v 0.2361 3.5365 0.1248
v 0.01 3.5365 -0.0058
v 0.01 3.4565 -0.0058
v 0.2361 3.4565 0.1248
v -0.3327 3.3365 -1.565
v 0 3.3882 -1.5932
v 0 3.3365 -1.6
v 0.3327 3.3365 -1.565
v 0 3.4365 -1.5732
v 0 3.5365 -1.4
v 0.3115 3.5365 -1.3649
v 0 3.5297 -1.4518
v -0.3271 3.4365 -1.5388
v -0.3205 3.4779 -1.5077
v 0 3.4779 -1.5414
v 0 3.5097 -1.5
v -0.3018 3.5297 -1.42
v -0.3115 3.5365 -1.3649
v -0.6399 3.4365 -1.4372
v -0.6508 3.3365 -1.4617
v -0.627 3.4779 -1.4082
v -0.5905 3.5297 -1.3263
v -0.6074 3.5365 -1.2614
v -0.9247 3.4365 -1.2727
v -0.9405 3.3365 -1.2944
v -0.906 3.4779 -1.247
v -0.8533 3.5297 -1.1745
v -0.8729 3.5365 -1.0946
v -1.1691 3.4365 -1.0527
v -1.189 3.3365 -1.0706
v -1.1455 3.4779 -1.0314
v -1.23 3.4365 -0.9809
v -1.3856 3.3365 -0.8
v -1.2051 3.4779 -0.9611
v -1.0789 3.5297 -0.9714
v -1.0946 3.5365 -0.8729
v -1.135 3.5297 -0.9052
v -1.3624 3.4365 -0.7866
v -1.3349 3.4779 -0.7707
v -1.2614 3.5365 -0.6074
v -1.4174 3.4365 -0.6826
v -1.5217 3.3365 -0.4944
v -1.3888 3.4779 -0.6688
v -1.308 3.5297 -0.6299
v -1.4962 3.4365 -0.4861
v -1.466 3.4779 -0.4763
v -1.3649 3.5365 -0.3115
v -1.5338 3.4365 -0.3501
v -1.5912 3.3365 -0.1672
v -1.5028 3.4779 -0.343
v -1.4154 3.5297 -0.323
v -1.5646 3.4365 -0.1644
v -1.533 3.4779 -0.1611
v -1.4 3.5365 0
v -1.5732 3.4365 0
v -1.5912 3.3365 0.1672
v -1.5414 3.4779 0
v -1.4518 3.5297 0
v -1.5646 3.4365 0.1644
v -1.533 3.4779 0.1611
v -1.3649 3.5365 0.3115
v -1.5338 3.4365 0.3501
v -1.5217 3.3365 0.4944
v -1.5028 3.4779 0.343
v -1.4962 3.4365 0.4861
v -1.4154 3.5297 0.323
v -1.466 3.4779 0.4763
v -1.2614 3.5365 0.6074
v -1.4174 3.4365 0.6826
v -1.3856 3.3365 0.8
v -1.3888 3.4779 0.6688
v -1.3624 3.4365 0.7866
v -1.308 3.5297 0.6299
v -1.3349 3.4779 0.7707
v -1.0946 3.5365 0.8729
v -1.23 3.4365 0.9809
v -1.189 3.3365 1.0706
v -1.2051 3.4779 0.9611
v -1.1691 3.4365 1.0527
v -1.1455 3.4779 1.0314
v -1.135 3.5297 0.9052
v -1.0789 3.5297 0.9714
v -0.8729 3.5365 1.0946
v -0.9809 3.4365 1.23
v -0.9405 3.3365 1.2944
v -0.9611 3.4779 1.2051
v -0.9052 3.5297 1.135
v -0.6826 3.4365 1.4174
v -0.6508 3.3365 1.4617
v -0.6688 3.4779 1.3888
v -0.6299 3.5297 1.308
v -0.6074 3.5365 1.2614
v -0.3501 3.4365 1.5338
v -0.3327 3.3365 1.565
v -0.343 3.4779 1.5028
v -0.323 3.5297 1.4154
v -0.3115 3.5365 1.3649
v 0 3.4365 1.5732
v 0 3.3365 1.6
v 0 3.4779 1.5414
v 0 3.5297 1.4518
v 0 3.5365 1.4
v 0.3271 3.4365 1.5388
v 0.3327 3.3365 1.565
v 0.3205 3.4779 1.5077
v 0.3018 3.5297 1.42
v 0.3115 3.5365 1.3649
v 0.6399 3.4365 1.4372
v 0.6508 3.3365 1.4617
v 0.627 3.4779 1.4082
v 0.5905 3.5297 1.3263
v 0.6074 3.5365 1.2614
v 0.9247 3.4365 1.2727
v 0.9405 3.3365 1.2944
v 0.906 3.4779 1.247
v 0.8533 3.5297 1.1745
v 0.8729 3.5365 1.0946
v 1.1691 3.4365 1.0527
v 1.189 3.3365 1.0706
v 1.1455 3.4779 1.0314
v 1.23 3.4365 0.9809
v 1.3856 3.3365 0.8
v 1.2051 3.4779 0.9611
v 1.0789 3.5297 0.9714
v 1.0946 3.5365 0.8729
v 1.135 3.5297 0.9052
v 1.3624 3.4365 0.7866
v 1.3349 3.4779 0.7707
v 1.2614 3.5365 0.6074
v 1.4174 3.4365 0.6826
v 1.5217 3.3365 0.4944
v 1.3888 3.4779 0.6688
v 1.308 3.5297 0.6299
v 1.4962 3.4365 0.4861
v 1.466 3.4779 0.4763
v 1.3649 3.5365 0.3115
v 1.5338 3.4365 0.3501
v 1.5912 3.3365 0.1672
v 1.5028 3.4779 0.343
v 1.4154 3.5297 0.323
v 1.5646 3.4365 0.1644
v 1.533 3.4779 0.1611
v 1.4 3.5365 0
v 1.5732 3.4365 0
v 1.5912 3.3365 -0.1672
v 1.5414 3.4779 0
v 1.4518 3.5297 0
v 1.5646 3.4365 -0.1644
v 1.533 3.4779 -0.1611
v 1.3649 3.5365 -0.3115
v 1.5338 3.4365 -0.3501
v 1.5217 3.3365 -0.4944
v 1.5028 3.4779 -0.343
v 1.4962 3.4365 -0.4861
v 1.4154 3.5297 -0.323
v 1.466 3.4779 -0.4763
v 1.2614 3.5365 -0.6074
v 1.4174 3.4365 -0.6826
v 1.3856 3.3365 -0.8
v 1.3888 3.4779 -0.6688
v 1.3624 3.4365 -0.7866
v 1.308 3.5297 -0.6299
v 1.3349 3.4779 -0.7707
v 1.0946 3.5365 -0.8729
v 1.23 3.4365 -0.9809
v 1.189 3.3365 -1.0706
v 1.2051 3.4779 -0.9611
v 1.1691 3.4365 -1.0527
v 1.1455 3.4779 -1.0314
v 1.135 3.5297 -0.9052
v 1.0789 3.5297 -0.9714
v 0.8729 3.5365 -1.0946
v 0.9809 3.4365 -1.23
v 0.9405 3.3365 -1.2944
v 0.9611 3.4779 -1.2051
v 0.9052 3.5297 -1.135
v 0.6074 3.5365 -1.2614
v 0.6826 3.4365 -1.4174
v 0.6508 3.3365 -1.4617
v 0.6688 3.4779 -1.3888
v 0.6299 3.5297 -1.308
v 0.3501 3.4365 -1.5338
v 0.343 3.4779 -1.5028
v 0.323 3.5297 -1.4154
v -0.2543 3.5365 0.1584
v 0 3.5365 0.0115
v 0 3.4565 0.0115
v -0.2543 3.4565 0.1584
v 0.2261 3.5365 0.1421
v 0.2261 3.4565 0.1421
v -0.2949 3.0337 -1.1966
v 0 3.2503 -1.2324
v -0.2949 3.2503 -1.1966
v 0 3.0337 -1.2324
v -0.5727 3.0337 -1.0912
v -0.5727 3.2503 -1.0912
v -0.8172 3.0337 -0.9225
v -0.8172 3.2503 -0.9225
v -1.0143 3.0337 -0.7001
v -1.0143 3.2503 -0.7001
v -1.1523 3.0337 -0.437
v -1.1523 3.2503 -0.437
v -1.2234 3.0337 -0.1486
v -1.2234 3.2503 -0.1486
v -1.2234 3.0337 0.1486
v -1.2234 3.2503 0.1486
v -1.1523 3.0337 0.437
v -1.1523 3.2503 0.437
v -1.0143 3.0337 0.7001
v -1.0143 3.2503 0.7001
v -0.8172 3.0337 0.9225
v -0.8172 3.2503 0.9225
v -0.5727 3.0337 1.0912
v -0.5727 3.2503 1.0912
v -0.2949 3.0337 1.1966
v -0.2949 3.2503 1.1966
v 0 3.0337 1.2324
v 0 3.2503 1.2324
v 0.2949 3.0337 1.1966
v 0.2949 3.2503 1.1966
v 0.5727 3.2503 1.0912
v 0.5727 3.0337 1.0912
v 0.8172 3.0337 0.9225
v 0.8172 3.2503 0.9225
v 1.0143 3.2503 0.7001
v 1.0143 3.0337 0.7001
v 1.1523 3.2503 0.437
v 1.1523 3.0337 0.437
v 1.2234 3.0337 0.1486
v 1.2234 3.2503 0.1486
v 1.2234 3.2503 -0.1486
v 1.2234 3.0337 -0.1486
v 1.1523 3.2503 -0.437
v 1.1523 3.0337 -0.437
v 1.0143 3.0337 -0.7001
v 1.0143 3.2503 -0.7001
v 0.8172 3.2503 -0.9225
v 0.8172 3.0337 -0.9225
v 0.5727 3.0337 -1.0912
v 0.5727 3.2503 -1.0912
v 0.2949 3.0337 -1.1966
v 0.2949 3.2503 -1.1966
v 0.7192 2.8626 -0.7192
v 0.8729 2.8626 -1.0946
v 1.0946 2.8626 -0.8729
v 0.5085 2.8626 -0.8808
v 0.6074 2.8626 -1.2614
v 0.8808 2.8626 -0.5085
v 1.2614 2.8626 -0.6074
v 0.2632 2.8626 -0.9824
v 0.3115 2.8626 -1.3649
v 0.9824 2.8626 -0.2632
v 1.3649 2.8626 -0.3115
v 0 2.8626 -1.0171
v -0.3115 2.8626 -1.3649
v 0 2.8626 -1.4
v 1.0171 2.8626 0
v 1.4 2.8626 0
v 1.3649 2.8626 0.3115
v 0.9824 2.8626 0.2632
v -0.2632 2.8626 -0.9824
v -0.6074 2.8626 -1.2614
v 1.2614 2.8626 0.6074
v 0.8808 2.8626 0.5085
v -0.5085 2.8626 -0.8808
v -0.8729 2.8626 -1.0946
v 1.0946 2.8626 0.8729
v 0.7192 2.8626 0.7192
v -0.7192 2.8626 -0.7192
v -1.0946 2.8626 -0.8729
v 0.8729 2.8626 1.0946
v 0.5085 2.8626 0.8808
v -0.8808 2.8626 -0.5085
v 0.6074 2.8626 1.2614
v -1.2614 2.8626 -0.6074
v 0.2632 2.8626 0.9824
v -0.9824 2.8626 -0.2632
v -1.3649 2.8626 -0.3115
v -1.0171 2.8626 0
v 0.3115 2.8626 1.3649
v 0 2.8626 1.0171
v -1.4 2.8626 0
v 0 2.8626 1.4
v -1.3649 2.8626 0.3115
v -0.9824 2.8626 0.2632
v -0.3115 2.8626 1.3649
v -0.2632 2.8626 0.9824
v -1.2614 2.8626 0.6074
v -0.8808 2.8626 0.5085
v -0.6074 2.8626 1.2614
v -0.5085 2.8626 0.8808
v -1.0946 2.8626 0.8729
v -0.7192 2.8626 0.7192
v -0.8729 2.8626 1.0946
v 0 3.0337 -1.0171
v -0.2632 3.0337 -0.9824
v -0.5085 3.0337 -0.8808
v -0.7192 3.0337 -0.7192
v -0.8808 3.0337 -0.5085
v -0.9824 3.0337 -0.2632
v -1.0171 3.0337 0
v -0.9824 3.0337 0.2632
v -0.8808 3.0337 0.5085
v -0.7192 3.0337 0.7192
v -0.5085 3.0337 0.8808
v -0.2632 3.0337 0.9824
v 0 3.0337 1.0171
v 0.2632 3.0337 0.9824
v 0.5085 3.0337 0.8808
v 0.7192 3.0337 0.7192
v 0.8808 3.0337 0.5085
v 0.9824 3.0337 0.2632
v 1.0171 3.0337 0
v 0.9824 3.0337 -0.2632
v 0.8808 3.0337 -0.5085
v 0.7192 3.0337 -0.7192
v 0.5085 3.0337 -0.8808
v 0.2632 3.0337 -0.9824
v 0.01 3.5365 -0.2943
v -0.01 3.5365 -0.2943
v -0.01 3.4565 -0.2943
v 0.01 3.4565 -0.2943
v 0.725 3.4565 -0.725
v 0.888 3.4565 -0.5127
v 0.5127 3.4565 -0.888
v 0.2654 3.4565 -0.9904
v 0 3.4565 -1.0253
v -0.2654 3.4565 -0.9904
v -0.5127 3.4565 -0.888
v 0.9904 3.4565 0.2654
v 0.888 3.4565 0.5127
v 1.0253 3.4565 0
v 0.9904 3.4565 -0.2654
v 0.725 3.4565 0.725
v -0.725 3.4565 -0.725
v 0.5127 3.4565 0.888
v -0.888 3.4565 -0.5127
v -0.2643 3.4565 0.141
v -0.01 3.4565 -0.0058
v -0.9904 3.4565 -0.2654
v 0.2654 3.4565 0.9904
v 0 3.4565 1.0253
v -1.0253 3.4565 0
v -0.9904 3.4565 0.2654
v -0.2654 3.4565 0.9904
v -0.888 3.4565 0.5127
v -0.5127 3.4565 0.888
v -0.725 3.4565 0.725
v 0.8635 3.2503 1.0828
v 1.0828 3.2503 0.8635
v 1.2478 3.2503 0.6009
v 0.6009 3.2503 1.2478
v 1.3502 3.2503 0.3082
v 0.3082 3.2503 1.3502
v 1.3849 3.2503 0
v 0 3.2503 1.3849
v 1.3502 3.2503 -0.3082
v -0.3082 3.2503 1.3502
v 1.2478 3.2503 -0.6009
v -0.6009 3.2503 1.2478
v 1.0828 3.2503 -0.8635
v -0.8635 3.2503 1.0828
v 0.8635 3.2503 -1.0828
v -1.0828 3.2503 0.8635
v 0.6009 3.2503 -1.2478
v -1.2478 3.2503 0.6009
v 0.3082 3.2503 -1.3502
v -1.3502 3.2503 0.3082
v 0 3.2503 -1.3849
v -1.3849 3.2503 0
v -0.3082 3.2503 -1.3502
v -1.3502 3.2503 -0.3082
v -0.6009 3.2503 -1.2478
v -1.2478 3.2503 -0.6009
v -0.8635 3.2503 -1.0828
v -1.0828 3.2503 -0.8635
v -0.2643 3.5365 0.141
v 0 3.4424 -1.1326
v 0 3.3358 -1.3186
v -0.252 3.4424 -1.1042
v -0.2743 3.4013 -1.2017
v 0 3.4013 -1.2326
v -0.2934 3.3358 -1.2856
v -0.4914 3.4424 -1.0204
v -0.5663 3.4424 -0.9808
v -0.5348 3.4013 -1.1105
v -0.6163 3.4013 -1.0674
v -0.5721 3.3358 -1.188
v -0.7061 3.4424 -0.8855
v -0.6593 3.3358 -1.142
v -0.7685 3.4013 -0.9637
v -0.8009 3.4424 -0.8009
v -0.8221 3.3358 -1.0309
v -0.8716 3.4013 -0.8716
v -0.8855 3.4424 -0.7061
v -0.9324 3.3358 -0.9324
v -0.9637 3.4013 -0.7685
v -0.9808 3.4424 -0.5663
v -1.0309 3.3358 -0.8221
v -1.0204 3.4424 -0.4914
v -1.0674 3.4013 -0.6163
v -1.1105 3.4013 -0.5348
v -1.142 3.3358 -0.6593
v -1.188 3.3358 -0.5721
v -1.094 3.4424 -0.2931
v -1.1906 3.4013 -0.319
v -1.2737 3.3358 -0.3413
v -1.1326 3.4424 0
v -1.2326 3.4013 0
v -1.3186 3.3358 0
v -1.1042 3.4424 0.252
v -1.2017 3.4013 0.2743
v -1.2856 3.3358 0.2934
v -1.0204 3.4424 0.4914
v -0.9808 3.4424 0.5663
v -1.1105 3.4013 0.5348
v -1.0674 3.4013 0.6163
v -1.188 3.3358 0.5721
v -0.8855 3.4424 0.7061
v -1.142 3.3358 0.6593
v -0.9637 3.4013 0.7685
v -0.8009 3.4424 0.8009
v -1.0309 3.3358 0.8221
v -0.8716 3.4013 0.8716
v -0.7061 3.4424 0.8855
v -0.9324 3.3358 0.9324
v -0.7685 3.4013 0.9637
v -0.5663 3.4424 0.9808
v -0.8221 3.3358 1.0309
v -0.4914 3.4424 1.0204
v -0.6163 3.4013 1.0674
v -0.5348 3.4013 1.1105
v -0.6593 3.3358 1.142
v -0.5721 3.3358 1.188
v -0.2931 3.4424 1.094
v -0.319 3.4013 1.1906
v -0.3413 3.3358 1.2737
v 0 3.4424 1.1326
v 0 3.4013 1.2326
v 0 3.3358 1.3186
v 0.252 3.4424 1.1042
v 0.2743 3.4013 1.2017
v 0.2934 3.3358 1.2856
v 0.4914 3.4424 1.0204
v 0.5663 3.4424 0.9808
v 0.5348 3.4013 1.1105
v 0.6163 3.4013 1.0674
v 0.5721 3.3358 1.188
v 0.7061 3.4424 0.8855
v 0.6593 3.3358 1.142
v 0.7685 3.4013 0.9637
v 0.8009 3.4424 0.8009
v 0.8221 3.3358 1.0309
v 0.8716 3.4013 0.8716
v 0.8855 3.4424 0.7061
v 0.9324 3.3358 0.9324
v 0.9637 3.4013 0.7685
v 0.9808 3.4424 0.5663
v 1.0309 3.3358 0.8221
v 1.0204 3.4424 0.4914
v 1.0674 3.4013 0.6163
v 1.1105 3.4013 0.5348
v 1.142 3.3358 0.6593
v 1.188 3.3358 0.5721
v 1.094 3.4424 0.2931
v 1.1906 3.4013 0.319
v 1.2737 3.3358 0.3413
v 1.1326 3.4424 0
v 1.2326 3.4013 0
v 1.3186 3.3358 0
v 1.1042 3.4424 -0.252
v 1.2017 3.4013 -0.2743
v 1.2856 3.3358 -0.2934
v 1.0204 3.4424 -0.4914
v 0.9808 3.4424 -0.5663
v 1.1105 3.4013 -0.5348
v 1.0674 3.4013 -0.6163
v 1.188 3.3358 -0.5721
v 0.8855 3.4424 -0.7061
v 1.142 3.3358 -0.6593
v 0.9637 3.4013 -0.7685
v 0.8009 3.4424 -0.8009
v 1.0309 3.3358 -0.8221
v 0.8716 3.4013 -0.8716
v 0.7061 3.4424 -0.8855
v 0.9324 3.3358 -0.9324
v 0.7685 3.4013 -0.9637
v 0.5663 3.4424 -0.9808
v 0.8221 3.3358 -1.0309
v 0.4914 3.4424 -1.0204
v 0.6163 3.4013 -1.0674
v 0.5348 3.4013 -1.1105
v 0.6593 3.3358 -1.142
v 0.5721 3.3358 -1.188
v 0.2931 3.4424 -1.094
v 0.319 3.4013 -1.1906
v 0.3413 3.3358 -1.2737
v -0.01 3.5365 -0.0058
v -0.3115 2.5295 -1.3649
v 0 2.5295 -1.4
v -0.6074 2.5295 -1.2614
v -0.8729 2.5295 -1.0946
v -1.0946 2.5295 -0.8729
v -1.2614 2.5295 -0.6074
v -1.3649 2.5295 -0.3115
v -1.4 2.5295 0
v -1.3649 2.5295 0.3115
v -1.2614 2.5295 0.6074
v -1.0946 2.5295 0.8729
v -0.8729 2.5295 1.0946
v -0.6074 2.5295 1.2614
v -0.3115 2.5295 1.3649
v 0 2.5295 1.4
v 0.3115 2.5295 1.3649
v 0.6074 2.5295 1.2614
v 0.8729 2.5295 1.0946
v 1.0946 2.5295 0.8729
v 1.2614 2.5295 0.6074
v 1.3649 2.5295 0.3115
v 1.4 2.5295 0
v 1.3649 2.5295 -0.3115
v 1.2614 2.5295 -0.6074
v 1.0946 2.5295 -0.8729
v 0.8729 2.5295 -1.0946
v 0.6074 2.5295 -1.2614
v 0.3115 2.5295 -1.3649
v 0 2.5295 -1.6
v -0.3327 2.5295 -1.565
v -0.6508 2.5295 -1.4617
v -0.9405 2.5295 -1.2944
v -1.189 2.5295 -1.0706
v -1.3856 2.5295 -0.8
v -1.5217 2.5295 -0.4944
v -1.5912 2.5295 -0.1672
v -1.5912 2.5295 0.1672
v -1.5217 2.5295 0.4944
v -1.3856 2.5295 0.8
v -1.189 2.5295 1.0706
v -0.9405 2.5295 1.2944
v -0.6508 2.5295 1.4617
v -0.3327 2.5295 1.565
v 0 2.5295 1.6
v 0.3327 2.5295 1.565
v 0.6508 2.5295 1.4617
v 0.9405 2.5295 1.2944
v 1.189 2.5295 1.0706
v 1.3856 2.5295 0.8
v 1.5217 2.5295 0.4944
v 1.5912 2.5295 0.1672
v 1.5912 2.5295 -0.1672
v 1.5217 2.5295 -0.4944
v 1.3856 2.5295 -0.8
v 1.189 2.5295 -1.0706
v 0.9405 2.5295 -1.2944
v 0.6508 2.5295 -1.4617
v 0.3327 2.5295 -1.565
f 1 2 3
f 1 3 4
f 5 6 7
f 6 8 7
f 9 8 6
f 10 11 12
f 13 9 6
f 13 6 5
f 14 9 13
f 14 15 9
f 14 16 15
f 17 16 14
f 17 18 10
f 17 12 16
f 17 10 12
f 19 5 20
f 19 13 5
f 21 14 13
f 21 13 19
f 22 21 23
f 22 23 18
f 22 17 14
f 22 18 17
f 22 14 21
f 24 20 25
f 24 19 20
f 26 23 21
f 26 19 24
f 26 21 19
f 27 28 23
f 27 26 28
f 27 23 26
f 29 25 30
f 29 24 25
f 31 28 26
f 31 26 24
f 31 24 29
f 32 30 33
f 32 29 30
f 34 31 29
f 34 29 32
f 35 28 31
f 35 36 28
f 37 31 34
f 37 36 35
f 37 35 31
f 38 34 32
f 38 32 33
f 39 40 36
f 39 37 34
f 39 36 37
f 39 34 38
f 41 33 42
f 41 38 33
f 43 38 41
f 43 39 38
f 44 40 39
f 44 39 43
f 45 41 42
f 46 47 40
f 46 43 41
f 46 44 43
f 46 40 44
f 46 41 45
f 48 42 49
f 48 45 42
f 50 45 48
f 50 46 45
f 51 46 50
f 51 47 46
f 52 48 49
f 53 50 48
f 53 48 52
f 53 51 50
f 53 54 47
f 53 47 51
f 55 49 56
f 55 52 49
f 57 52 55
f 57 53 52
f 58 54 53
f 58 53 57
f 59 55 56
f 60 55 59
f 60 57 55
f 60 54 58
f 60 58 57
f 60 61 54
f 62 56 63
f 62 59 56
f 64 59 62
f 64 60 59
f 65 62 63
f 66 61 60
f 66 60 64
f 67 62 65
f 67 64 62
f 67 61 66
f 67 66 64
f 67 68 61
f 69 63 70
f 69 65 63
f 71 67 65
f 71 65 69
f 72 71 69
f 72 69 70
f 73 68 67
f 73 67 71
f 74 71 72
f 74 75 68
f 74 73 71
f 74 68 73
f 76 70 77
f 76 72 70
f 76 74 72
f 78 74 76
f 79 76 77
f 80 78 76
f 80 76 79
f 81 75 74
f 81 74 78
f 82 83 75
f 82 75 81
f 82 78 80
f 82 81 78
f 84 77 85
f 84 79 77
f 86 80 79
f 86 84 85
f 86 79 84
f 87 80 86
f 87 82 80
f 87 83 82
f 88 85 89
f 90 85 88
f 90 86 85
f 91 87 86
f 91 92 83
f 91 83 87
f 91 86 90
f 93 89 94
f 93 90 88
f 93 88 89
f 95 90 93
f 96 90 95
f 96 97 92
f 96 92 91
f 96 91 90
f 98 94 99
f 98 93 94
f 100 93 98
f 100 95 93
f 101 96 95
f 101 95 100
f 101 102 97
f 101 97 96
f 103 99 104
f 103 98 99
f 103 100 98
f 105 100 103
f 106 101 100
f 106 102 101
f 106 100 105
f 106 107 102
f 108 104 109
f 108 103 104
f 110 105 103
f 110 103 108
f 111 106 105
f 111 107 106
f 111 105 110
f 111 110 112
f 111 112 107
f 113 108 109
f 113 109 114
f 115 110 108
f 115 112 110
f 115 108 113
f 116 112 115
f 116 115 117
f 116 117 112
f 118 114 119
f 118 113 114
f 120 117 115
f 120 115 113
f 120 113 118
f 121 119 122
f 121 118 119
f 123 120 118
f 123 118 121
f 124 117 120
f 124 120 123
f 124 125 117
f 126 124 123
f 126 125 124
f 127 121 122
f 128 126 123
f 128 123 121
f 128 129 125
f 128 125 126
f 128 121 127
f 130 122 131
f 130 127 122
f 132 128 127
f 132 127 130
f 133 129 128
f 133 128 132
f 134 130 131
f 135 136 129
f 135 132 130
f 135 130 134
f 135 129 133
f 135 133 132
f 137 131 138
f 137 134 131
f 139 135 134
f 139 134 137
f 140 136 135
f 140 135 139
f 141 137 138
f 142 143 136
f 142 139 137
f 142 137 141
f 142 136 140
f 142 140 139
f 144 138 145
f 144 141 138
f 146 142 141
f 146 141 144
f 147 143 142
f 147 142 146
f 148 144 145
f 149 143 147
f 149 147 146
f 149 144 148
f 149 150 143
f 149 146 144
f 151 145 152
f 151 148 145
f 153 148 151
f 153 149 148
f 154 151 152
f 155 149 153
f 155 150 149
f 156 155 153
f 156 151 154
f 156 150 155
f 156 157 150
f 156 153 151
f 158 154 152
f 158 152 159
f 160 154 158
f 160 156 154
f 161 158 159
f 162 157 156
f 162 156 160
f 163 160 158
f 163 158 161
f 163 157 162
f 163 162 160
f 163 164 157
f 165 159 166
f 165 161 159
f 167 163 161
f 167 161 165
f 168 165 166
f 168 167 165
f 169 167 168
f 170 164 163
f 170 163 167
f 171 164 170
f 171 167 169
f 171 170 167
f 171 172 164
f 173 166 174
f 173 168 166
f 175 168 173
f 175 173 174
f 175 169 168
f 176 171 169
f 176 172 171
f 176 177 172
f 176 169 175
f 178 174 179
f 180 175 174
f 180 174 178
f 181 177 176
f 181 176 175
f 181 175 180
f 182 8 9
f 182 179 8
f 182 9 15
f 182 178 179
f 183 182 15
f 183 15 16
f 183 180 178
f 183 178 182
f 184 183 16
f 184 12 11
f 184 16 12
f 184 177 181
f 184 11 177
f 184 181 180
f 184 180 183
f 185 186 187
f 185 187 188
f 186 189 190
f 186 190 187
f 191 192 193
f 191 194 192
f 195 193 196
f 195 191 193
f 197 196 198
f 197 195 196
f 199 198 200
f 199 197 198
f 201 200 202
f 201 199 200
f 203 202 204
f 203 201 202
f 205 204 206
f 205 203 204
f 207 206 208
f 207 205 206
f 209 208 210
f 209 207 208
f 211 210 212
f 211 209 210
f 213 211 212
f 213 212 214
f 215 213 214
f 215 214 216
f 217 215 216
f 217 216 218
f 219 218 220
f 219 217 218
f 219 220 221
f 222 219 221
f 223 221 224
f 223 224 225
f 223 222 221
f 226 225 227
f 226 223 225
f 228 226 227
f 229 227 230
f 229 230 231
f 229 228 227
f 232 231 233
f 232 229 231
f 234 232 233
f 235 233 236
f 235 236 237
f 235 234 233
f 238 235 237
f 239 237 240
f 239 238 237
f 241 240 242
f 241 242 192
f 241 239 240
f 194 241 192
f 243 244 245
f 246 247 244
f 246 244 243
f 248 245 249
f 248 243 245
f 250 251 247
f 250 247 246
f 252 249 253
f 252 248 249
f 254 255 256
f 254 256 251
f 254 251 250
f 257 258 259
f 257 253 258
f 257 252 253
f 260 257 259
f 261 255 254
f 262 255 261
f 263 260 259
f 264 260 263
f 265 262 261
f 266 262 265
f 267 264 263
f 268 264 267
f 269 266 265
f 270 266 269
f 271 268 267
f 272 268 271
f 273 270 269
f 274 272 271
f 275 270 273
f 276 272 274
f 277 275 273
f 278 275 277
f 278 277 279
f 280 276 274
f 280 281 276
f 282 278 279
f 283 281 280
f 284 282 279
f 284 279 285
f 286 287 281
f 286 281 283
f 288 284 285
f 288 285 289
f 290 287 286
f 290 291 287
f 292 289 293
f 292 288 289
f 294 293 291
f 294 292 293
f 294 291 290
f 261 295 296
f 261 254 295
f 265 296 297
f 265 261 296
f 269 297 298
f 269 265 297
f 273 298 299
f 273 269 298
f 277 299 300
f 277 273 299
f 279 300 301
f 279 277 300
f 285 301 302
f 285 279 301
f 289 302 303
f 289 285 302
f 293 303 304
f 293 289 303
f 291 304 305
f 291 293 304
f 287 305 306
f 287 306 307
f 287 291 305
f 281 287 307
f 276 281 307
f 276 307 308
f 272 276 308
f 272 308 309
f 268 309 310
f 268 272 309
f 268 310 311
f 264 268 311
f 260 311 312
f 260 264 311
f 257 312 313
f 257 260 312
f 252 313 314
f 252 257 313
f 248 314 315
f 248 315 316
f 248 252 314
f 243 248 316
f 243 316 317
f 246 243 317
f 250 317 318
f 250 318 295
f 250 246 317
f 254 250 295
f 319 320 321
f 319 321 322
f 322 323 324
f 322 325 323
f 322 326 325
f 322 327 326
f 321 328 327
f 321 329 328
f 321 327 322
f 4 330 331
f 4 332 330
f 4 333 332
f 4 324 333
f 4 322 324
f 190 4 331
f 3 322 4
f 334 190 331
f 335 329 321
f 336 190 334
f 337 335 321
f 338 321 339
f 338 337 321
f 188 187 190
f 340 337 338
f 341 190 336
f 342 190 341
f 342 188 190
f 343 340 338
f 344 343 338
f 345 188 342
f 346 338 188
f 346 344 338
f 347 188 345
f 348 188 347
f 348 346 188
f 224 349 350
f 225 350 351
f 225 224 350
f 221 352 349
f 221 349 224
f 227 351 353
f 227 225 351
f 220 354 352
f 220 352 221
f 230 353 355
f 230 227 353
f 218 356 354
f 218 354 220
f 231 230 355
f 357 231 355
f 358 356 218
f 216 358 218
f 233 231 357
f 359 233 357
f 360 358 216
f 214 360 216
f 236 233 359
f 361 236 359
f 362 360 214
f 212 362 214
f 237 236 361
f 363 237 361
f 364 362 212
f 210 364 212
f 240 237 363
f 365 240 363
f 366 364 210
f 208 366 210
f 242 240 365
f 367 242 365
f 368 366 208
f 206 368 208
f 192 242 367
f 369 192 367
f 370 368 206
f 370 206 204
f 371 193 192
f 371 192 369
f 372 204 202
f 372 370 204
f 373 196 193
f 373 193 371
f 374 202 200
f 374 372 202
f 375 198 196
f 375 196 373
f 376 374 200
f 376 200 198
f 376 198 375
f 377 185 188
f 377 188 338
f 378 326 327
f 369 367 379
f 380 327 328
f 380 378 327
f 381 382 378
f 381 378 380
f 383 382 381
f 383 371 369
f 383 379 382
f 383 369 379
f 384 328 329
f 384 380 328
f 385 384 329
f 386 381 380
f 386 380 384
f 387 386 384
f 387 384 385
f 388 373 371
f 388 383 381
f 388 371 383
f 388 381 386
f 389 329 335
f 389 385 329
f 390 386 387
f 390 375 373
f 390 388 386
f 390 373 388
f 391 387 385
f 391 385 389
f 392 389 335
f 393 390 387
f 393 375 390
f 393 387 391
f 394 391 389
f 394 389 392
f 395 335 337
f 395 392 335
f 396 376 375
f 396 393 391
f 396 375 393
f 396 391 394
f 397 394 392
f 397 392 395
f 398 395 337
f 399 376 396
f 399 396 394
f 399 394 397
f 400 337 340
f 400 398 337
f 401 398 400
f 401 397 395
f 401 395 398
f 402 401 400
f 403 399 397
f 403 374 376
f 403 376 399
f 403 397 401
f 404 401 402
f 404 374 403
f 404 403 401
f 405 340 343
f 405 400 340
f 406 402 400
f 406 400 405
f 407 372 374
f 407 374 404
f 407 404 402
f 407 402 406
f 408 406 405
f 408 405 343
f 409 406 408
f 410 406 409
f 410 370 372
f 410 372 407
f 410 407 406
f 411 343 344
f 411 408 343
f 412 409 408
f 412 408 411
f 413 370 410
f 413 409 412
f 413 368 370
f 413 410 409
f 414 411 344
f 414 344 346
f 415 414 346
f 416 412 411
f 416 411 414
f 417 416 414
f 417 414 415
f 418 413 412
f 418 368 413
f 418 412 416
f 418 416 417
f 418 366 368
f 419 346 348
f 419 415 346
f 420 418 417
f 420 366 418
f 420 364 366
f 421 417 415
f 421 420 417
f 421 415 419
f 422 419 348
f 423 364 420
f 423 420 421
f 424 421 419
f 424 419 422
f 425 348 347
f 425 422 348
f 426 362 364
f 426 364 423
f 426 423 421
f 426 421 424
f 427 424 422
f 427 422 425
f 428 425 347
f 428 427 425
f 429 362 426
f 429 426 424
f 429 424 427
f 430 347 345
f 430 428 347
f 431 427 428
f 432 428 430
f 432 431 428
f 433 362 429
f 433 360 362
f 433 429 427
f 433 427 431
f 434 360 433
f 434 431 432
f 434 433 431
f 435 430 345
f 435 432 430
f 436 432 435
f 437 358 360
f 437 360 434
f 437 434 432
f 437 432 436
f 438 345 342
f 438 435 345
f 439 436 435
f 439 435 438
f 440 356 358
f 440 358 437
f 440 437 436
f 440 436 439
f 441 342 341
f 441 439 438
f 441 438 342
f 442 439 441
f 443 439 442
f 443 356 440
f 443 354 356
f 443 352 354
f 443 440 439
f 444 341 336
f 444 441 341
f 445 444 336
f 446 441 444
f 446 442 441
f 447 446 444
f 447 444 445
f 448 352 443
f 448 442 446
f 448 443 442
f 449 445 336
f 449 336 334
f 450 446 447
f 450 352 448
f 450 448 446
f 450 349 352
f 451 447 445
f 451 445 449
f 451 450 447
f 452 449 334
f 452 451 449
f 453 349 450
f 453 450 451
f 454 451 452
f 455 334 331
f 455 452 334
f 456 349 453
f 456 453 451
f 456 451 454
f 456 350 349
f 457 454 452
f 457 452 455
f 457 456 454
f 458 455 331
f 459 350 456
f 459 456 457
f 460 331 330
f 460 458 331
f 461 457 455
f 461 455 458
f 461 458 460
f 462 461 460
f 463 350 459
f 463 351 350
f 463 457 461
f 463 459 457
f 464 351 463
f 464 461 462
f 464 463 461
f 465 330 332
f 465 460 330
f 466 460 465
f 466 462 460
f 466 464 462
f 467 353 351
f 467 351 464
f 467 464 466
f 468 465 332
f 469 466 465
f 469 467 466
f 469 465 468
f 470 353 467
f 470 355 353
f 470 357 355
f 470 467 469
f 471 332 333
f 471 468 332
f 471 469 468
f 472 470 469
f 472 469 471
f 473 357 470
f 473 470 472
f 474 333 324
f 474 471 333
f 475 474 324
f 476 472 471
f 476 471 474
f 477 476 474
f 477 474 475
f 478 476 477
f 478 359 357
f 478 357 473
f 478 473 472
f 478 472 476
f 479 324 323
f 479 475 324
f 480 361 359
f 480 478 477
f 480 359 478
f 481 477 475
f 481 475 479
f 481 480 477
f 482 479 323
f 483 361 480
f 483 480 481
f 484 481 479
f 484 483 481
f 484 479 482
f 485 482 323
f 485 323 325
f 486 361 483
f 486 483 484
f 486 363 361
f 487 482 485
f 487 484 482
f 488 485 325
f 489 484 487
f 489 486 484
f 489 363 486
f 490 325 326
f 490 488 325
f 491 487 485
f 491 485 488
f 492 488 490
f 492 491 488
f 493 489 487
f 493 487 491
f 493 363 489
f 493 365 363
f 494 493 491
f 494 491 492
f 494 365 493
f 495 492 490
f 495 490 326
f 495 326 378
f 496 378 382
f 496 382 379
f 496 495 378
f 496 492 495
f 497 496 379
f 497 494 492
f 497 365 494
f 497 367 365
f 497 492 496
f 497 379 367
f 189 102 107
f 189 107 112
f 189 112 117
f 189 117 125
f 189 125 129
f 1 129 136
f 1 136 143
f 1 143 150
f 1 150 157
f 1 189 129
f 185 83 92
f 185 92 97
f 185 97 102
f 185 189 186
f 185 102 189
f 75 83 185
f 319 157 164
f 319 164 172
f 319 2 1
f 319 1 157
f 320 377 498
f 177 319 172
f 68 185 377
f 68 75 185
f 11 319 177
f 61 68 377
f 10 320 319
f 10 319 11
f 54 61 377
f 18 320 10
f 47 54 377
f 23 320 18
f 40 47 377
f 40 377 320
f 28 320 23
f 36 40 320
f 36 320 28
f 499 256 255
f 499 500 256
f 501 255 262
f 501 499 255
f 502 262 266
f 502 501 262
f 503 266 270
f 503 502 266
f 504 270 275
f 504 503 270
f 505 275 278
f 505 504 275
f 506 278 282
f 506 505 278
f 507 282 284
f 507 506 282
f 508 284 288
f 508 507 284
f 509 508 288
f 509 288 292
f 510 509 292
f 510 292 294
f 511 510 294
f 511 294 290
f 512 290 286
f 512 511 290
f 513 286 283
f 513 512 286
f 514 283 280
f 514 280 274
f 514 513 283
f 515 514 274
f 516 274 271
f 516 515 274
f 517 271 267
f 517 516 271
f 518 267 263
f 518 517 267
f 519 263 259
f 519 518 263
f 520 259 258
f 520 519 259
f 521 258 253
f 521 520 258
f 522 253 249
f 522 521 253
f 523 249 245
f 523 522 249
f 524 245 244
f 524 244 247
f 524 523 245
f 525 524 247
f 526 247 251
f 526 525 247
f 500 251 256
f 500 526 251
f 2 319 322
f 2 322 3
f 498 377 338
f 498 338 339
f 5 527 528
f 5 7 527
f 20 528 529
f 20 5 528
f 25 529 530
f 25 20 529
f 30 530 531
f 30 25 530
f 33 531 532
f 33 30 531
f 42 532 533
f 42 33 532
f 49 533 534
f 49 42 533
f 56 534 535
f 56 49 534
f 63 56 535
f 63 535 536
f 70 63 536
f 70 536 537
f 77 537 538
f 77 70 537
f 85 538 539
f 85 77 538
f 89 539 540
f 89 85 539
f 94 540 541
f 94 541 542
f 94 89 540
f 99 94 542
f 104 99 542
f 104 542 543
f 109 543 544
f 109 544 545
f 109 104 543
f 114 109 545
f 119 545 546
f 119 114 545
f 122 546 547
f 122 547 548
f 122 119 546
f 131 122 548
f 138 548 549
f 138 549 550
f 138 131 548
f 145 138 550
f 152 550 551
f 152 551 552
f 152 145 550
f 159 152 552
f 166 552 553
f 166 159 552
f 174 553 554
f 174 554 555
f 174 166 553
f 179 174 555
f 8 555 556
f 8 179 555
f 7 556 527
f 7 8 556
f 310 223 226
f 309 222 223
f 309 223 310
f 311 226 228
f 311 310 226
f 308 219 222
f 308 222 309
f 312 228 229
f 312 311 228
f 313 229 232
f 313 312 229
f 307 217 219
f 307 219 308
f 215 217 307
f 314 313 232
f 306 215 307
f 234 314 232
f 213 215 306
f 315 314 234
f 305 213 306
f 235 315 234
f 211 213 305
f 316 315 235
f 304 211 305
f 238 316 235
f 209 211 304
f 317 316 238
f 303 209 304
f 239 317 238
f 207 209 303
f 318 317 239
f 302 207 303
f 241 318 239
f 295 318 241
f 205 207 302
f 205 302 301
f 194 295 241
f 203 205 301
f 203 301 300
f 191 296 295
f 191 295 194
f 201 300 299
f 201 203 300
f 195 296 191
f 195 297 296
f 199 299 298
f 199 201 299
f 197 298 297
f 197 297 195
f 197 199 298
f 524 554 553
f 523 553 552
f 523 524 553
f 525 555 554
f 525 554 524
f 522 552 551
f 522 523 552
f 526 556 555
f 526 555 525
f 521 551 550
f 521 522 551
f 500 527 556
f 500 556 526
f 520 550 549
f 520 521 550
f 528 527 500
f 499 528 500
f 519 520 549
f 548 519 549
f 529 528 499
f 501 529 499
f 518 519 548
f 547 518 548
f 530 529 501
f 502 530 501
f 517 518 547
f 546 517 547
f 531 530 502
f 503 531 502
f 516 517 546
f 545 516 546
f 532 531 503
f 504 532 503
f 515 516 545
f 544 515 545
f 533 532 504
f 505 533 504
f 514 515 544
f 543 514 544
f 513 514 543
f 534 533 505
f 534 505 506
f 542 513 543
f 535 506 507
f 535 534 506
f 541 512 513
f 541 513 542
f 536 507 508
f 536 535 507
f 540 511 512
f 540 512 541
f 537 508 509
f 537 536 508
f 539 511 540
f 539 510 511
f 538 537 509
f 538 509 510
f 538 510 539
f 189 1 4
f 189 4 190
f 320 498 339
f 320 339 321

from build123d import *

# Parameters (mm, degrees)
CUT_EXTRUDE_1_DEPTH = 5


with BuildPart() as part:
    # 草图1 → 旋转1 (revolve)
    with BuildSketch(Plane.XY, mode=Mode.PRIVATE) as revolve_1_sk:
        with BuildLine():
            Line((1.4, 3.536467832), (0, 3.536467832))
            Line((0, 3.536467832), (0, 3.456467832))
            Line((0, 3.456467832), (1.025340725, 3.456467832))
            ThreePointArc((1.025340725, 3.456467832), (1.232580693, 3.401271645), (1.384912004, 3.250307427))
            Line((1.384912004, 3.250307427), (1.232407542, 3.250307427))
            Line((1.232407542, 3.250307427), (1.232407542, 3.033675945))
            Line((1.232407542, 3.033675945), (1.017066371, 3.033675945))
            Line((1.017066371, 3.033675945), (1.017066371, 2.862597605))
            Line((1.017066371, 2.862597605), (1.4, 2.862597605))
            Line((1.4, 2.862597605), (1.4, 2.529500902))
            Line((1.4, 2.529500902), (1.6, 2.529500902))
            Line((1.6, 2.529500902), (1.6, 3.336467832))
            ThreePointArc((1.6, 3.336467832), (1.541421356, 3.477889188), (1.4, 3.536467832))
        make_face()
    revolve(revolve_1_sk.sketch.rotate(Axis((0, -6.038326455, 0), (0, 1, 0)), 90), axis=Axis((0, -6.038326455, 0), (0, 1, 0)))

    # 草图2 → 切除-拉伸1 (cut)
    with BuildSketch(Plane(origin=(0, 3.536467832, 0), x_dir=(1, 0, 0), z_dir=(0, 1, 0))):
        Polygon((0, -0.011547005), (-0.254294351, -0.158363917), (-0.264294351, -0.141043409), (-0.01, 0.005773503), (-0.01, 0.294280869), (0.01, 0.294280869), (0.01, 0.005773503), (0.236087164, -0.124757983), (0.226087164, -0.142078491), align=None)
    extrude(amount=-CUT_EXTRUDE_1_DEPTH, mode=Mode.SUBTRACT)


solid = part.part
